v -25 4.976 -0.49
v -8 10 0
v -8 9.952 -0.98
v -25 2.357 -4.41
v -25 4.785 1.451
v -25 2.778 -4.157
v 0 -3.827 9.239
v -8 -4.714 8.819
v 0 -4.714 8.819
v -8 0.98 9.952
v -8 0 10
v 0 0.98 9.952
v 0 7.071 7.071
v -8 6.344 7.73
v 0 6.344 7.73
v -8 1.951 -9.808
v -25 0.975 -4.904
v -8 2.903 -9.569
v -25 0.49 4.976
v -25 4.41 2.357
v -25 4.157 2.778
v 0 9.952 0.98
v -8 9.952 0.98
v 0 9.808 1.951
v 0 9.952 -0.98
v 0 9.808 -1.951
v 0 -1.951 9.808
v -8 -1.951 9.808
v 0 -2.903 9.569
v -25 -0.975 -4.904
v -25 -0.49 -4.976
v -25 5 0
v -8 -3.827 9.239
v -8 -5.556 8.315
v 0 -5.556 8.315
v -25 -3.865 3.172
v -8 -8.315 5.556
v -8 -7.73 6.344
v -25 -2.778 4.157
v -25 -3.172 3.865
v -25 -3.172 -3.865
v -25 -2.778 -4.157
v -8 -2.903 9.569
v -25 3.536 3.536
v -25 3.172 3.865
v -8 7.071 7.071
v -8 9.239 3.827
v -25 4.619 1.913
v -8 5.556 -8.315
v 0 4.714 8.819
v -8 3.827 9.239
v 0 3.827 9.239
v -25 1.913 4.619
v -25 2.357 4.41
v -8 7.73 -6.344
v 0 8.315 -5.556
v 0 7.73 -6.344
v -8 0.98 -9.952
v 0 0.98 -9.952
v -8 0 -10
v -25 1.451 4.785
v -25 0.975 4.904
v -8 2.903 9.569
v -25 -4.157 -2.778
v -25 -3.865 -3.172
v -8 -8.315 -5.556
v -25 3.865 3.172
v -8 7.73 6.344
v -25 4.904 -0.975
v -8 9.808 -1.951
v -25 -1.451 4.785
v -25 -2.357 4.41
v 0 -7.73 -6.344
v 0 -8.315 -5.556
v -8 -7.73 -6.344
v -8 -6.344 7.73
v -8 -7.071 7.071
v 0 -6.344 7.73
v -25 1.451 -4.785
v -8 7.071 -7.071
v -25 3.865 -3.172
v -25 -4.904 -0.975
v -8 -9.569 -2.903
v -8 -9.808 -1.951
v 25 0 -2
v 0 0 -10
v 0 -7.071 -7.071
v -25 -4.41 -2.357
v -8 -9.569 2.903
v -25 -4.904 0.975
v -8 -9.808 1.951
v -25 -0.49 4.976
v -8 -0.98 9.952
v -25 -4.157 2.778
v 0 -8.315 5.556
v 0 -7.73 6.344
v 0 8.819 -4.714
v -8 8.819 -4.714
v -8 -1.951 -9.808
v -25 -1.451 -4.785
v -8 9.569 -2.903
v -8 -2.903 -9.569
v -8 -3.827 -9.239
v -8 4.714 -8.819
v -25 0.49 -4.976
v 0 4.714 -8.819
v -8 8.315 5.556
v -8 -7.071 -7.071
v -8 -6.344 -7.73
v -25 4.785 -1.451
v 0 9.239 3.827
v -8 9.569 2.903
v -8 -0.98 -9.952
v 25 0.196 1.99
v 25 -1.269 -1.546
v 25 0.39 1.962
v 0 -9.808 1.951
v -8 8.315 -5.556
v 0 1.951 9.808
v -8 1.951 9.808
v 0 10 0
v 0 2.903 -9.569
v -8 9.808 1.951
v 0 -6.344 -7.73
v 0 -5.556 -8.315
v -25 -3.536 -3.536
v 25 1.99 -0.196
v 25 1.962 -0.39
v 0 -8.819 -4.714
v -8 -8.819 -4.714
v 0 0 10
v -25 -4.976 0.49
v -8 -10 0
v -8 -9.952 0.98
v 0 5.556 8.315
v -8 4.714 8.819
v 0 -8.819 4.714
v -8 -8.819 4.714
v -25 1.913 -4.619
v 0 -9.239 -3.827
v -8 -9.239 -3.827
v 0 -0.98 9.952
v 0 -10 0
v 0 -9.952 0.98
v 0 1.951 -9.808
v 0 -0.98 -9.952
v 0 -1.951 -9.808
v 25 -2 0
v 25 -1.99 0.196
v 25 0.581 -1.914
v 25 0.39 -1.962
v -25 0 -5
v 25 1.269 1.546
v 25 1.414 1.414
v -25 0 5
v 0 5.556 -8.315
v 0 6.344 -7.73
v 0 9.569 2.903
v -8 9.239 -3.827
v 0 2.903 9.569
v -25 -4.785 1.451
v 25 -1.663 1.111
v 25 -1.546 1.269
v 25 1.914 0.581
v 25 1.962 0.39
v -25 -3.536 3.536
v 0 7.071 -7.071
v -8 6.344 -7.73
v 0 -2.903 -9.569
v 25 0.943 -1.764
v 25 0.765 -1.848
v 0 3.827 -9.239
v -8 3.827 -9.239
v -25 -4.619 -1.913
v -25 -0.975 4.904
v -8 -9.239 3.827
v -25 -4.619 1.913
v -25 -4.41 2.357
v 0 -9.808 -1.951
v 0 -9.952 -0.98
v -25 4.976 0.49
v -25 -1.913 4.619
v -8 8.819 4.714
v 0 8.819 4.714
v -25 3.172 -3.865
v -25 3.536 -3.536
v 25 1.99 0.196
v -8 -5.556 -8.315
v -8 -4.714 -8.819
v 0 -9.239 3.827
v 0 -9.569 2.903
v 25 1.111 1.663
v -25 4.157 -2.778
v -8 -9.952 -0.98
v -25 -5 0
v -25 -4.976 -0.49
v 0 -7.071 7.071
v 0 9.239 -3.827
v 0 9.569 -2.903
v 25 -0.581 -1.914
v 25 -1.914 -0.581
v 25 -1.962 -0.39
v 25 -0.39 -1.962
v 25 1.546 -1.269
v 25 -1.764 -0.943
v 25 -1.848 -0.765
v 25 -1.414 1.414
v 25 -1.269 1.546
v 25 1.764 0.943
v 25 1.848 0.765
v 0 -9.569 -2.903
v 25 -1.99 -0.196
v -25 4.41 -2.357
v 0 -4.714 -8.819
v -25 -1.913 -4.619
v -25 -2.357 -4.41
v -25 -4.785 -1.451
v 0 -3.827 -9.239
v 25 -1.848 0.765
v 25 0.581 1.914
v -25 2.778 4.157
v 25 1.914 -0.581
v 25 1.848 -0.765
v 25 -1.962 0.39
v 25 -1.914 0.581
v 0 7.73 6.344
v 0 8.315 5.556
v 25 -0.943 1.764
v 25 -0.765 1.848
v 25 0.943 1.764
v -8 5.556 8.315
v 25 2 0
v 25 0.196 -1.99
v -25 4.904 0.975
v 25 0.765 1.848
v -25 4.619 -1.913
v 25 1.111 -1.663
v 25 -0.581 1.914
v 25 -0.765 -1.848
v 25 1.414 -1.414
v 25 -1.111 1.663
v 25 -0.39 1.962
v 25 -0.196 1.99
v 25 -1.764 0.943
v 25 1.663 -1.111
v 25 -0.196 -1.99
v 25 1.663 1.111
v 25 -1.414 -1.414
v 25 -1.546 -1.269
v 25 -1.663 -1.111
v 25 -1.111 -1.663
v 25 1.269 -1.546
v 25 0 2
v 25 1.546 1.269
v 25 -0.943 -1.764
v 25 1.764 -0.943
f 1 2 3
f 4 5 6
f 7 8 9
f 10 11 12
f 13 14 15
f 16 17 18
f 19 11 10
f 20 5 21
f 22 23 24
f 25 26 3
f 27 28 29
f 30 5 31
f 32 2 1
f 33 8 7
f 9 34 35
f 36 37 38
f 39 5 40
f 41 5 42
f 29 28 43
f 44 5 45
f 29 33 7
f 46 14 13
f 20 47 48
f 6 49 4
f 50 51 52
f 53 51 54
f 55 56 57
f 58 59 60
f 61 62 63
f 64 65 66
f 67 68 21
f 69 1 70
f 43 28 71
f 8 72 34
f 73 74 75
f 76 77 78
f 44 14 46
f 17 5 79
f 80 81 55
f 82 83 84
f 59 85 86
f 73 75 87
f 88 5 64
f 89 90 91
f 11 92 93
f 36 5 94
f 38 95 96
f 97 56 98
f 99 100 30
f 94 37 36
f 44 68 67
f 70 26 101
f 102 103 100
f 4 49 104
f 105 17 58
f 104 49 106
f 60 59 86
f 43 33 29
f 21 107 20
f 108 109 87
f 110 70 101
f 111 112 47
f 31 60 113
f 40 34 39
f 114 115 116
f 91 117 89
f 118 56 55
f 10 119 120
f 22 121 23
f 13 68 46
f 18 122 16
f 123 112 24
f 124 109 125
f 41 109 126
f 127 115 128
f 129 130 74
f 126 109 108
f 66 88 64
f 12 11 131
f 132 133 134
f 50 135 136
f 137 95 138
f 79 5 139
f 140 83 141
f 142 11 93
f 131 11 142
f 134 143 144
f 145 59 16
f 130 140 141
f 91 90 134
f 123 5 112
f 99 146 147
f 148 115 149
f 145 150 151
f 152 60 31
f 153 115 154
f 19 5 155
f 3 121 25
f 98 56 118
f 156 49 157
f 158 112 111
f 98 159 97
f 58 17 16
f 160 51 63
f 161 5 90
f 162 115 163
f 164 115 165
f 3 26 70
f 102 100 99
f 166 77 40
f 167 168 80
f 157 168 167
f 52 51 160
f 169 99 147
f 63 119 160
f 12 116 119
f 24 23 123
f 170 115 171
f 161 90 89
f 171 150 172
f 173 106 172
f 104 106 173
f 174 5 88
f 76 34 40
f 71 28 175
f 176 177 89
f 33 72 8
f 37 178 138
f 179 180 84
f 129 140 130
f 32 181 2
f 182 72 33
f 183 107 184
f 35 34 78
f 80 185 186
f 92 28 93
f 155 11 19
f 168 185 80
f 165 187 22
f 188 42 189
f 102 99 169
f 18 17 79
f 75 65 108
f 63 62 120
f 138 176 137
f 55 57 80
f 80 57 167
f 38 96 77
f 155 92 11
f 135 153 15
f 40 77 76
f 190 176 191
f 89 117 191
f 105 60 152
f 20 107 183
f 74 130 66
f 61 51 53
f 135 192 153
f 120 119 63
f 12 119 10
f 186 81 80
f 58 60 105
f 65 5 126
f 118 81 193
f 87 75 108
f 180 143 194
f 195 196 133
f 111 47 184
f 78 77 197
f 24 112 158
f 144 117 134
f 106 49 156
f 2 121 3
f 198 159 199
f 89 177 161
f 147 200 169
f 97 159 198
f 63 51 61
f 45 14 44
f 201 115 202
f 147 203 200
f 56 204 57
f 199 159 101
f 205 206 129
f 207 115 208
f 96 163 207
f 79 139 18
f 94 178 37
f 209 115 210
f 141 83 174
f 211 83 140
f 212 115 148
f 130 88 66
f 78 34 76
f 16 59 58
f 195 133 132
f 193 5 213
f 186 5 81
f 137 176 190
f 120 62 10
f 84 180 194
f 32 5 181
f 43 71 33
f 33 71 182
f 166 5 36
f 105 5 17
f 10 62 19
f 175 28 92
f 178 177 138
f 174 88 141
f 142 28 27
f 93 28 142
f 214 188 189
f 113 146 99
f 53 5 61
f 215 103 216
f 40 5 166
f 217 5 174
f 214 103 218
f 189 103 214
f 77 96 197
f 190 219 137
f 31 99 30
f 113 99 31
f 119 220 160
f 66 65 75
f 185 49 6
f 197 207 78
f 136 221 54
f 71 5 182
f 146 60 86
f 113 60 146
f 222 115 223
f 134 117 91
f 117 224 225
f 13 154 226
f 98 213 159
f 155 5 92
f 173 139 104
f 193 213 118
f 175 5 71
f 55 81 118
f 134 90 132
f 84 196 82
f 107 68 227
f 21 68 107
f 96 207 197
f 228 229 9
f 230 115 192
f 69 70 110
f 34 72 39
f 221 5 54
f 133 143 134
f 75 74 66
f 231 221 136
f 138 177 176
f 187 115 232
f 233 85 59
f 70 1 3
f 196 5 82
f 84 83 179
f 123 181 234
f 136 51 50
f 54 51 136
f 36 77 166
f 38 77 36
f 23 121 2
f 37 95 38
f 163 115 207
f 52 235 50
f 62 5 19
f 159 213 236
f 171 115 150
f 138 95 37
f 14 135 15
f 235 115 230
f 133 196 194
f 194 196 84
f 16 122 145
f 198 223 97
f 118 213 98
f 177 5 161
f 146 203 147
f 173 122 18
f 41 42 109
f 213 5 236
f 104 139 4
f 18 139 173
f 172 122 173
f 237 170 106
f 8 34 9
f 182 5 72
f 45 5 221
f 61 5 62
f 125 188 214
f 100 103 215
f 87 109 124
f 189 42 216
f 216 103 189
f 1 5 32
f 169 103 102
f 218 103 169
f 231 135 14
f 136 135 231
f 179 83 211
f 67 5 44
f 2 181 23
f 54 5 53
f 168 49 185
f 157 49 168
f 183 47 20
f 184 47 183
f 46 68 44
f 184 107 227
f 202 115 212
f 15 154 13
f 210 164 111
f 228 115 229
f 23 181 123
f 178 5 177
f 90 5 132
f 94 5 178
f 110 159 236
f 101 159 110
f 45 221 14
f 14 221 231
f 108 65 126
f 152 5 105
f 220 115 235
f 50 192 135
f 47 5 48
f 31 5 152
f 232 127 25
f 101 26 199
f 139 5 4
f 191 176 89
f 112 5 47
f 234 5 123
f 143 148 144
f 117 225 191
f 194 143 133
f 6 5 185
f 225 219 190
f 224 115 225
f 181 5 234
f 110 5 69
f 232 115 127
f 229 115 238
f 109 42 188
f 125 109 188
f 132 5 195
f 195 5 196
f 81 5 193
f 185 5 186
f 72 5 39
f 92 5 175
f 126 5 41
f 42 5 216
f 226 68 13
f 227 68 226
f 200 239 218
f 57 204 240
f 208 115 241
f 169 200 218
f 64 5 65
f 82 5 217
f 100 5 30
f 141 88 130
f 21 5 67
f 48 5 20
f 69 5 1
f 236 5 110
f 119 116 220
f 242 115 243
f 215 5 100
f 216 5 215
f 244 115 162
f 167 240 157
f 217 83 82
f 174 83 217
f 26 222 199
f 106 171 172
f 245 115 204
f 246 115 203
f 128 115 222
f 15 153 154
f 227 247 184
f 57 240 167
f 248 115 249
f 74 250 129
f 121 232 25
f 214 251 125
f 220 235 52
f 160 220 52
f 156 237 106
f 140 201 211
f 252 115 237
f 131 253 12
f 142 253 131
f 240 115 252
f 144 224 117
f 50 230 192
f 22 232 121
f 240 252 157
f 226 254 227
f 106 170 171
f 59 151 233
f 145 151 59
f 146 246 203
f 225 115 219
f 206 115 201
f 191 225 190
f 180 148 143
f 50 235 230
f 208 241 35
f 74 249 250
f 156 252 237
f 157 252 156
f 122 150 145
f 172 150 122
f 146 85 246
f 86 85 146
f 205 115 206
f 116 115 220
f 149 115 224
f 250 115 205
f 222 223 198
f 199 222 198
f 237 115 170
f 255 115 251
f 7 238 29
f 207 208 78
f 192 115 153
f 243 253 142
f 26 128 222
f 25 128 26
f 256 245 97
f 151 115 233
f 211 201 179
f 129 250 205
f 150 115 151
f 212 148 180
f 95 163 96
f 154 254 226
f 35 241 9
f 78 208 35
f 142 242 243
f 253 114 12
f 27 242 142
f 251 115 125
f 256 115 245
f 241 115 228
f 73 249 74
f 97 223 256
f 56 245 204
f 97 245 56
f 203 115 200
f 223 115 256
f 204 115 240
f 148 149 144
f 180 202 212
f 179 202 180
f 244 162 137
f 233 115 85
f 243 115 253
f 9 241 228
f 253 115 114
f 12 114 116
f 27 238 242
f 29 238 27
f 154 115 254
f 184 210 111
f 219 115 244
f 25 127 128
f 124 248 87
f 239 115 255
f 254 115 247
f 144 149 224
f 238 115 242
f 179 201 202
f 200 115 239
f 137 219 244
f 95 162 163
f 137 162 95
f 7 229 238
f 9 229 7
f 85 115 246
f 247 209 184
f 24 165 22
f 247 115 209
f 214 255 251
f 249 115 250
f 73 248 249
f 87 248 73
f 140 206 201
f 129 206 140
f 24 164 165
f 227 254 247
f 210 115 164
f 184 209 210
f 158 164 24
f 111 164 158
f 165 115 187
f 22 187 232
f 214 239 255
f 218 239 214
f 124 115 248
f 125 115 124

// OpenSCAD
$fn = 64;

hull() {
    translate([-20, 0, 0])
        rotate([0, -90, 0])
            cylinder(h=5, r=5);

    translate([0, 0, 0])
        rotate([0, -90, 0])
            cylinder(h=8, r=10);

    translate([25, 0, 0])
        rotate([0, -90, 0])
            cylinder(h=6, r=2);
}
